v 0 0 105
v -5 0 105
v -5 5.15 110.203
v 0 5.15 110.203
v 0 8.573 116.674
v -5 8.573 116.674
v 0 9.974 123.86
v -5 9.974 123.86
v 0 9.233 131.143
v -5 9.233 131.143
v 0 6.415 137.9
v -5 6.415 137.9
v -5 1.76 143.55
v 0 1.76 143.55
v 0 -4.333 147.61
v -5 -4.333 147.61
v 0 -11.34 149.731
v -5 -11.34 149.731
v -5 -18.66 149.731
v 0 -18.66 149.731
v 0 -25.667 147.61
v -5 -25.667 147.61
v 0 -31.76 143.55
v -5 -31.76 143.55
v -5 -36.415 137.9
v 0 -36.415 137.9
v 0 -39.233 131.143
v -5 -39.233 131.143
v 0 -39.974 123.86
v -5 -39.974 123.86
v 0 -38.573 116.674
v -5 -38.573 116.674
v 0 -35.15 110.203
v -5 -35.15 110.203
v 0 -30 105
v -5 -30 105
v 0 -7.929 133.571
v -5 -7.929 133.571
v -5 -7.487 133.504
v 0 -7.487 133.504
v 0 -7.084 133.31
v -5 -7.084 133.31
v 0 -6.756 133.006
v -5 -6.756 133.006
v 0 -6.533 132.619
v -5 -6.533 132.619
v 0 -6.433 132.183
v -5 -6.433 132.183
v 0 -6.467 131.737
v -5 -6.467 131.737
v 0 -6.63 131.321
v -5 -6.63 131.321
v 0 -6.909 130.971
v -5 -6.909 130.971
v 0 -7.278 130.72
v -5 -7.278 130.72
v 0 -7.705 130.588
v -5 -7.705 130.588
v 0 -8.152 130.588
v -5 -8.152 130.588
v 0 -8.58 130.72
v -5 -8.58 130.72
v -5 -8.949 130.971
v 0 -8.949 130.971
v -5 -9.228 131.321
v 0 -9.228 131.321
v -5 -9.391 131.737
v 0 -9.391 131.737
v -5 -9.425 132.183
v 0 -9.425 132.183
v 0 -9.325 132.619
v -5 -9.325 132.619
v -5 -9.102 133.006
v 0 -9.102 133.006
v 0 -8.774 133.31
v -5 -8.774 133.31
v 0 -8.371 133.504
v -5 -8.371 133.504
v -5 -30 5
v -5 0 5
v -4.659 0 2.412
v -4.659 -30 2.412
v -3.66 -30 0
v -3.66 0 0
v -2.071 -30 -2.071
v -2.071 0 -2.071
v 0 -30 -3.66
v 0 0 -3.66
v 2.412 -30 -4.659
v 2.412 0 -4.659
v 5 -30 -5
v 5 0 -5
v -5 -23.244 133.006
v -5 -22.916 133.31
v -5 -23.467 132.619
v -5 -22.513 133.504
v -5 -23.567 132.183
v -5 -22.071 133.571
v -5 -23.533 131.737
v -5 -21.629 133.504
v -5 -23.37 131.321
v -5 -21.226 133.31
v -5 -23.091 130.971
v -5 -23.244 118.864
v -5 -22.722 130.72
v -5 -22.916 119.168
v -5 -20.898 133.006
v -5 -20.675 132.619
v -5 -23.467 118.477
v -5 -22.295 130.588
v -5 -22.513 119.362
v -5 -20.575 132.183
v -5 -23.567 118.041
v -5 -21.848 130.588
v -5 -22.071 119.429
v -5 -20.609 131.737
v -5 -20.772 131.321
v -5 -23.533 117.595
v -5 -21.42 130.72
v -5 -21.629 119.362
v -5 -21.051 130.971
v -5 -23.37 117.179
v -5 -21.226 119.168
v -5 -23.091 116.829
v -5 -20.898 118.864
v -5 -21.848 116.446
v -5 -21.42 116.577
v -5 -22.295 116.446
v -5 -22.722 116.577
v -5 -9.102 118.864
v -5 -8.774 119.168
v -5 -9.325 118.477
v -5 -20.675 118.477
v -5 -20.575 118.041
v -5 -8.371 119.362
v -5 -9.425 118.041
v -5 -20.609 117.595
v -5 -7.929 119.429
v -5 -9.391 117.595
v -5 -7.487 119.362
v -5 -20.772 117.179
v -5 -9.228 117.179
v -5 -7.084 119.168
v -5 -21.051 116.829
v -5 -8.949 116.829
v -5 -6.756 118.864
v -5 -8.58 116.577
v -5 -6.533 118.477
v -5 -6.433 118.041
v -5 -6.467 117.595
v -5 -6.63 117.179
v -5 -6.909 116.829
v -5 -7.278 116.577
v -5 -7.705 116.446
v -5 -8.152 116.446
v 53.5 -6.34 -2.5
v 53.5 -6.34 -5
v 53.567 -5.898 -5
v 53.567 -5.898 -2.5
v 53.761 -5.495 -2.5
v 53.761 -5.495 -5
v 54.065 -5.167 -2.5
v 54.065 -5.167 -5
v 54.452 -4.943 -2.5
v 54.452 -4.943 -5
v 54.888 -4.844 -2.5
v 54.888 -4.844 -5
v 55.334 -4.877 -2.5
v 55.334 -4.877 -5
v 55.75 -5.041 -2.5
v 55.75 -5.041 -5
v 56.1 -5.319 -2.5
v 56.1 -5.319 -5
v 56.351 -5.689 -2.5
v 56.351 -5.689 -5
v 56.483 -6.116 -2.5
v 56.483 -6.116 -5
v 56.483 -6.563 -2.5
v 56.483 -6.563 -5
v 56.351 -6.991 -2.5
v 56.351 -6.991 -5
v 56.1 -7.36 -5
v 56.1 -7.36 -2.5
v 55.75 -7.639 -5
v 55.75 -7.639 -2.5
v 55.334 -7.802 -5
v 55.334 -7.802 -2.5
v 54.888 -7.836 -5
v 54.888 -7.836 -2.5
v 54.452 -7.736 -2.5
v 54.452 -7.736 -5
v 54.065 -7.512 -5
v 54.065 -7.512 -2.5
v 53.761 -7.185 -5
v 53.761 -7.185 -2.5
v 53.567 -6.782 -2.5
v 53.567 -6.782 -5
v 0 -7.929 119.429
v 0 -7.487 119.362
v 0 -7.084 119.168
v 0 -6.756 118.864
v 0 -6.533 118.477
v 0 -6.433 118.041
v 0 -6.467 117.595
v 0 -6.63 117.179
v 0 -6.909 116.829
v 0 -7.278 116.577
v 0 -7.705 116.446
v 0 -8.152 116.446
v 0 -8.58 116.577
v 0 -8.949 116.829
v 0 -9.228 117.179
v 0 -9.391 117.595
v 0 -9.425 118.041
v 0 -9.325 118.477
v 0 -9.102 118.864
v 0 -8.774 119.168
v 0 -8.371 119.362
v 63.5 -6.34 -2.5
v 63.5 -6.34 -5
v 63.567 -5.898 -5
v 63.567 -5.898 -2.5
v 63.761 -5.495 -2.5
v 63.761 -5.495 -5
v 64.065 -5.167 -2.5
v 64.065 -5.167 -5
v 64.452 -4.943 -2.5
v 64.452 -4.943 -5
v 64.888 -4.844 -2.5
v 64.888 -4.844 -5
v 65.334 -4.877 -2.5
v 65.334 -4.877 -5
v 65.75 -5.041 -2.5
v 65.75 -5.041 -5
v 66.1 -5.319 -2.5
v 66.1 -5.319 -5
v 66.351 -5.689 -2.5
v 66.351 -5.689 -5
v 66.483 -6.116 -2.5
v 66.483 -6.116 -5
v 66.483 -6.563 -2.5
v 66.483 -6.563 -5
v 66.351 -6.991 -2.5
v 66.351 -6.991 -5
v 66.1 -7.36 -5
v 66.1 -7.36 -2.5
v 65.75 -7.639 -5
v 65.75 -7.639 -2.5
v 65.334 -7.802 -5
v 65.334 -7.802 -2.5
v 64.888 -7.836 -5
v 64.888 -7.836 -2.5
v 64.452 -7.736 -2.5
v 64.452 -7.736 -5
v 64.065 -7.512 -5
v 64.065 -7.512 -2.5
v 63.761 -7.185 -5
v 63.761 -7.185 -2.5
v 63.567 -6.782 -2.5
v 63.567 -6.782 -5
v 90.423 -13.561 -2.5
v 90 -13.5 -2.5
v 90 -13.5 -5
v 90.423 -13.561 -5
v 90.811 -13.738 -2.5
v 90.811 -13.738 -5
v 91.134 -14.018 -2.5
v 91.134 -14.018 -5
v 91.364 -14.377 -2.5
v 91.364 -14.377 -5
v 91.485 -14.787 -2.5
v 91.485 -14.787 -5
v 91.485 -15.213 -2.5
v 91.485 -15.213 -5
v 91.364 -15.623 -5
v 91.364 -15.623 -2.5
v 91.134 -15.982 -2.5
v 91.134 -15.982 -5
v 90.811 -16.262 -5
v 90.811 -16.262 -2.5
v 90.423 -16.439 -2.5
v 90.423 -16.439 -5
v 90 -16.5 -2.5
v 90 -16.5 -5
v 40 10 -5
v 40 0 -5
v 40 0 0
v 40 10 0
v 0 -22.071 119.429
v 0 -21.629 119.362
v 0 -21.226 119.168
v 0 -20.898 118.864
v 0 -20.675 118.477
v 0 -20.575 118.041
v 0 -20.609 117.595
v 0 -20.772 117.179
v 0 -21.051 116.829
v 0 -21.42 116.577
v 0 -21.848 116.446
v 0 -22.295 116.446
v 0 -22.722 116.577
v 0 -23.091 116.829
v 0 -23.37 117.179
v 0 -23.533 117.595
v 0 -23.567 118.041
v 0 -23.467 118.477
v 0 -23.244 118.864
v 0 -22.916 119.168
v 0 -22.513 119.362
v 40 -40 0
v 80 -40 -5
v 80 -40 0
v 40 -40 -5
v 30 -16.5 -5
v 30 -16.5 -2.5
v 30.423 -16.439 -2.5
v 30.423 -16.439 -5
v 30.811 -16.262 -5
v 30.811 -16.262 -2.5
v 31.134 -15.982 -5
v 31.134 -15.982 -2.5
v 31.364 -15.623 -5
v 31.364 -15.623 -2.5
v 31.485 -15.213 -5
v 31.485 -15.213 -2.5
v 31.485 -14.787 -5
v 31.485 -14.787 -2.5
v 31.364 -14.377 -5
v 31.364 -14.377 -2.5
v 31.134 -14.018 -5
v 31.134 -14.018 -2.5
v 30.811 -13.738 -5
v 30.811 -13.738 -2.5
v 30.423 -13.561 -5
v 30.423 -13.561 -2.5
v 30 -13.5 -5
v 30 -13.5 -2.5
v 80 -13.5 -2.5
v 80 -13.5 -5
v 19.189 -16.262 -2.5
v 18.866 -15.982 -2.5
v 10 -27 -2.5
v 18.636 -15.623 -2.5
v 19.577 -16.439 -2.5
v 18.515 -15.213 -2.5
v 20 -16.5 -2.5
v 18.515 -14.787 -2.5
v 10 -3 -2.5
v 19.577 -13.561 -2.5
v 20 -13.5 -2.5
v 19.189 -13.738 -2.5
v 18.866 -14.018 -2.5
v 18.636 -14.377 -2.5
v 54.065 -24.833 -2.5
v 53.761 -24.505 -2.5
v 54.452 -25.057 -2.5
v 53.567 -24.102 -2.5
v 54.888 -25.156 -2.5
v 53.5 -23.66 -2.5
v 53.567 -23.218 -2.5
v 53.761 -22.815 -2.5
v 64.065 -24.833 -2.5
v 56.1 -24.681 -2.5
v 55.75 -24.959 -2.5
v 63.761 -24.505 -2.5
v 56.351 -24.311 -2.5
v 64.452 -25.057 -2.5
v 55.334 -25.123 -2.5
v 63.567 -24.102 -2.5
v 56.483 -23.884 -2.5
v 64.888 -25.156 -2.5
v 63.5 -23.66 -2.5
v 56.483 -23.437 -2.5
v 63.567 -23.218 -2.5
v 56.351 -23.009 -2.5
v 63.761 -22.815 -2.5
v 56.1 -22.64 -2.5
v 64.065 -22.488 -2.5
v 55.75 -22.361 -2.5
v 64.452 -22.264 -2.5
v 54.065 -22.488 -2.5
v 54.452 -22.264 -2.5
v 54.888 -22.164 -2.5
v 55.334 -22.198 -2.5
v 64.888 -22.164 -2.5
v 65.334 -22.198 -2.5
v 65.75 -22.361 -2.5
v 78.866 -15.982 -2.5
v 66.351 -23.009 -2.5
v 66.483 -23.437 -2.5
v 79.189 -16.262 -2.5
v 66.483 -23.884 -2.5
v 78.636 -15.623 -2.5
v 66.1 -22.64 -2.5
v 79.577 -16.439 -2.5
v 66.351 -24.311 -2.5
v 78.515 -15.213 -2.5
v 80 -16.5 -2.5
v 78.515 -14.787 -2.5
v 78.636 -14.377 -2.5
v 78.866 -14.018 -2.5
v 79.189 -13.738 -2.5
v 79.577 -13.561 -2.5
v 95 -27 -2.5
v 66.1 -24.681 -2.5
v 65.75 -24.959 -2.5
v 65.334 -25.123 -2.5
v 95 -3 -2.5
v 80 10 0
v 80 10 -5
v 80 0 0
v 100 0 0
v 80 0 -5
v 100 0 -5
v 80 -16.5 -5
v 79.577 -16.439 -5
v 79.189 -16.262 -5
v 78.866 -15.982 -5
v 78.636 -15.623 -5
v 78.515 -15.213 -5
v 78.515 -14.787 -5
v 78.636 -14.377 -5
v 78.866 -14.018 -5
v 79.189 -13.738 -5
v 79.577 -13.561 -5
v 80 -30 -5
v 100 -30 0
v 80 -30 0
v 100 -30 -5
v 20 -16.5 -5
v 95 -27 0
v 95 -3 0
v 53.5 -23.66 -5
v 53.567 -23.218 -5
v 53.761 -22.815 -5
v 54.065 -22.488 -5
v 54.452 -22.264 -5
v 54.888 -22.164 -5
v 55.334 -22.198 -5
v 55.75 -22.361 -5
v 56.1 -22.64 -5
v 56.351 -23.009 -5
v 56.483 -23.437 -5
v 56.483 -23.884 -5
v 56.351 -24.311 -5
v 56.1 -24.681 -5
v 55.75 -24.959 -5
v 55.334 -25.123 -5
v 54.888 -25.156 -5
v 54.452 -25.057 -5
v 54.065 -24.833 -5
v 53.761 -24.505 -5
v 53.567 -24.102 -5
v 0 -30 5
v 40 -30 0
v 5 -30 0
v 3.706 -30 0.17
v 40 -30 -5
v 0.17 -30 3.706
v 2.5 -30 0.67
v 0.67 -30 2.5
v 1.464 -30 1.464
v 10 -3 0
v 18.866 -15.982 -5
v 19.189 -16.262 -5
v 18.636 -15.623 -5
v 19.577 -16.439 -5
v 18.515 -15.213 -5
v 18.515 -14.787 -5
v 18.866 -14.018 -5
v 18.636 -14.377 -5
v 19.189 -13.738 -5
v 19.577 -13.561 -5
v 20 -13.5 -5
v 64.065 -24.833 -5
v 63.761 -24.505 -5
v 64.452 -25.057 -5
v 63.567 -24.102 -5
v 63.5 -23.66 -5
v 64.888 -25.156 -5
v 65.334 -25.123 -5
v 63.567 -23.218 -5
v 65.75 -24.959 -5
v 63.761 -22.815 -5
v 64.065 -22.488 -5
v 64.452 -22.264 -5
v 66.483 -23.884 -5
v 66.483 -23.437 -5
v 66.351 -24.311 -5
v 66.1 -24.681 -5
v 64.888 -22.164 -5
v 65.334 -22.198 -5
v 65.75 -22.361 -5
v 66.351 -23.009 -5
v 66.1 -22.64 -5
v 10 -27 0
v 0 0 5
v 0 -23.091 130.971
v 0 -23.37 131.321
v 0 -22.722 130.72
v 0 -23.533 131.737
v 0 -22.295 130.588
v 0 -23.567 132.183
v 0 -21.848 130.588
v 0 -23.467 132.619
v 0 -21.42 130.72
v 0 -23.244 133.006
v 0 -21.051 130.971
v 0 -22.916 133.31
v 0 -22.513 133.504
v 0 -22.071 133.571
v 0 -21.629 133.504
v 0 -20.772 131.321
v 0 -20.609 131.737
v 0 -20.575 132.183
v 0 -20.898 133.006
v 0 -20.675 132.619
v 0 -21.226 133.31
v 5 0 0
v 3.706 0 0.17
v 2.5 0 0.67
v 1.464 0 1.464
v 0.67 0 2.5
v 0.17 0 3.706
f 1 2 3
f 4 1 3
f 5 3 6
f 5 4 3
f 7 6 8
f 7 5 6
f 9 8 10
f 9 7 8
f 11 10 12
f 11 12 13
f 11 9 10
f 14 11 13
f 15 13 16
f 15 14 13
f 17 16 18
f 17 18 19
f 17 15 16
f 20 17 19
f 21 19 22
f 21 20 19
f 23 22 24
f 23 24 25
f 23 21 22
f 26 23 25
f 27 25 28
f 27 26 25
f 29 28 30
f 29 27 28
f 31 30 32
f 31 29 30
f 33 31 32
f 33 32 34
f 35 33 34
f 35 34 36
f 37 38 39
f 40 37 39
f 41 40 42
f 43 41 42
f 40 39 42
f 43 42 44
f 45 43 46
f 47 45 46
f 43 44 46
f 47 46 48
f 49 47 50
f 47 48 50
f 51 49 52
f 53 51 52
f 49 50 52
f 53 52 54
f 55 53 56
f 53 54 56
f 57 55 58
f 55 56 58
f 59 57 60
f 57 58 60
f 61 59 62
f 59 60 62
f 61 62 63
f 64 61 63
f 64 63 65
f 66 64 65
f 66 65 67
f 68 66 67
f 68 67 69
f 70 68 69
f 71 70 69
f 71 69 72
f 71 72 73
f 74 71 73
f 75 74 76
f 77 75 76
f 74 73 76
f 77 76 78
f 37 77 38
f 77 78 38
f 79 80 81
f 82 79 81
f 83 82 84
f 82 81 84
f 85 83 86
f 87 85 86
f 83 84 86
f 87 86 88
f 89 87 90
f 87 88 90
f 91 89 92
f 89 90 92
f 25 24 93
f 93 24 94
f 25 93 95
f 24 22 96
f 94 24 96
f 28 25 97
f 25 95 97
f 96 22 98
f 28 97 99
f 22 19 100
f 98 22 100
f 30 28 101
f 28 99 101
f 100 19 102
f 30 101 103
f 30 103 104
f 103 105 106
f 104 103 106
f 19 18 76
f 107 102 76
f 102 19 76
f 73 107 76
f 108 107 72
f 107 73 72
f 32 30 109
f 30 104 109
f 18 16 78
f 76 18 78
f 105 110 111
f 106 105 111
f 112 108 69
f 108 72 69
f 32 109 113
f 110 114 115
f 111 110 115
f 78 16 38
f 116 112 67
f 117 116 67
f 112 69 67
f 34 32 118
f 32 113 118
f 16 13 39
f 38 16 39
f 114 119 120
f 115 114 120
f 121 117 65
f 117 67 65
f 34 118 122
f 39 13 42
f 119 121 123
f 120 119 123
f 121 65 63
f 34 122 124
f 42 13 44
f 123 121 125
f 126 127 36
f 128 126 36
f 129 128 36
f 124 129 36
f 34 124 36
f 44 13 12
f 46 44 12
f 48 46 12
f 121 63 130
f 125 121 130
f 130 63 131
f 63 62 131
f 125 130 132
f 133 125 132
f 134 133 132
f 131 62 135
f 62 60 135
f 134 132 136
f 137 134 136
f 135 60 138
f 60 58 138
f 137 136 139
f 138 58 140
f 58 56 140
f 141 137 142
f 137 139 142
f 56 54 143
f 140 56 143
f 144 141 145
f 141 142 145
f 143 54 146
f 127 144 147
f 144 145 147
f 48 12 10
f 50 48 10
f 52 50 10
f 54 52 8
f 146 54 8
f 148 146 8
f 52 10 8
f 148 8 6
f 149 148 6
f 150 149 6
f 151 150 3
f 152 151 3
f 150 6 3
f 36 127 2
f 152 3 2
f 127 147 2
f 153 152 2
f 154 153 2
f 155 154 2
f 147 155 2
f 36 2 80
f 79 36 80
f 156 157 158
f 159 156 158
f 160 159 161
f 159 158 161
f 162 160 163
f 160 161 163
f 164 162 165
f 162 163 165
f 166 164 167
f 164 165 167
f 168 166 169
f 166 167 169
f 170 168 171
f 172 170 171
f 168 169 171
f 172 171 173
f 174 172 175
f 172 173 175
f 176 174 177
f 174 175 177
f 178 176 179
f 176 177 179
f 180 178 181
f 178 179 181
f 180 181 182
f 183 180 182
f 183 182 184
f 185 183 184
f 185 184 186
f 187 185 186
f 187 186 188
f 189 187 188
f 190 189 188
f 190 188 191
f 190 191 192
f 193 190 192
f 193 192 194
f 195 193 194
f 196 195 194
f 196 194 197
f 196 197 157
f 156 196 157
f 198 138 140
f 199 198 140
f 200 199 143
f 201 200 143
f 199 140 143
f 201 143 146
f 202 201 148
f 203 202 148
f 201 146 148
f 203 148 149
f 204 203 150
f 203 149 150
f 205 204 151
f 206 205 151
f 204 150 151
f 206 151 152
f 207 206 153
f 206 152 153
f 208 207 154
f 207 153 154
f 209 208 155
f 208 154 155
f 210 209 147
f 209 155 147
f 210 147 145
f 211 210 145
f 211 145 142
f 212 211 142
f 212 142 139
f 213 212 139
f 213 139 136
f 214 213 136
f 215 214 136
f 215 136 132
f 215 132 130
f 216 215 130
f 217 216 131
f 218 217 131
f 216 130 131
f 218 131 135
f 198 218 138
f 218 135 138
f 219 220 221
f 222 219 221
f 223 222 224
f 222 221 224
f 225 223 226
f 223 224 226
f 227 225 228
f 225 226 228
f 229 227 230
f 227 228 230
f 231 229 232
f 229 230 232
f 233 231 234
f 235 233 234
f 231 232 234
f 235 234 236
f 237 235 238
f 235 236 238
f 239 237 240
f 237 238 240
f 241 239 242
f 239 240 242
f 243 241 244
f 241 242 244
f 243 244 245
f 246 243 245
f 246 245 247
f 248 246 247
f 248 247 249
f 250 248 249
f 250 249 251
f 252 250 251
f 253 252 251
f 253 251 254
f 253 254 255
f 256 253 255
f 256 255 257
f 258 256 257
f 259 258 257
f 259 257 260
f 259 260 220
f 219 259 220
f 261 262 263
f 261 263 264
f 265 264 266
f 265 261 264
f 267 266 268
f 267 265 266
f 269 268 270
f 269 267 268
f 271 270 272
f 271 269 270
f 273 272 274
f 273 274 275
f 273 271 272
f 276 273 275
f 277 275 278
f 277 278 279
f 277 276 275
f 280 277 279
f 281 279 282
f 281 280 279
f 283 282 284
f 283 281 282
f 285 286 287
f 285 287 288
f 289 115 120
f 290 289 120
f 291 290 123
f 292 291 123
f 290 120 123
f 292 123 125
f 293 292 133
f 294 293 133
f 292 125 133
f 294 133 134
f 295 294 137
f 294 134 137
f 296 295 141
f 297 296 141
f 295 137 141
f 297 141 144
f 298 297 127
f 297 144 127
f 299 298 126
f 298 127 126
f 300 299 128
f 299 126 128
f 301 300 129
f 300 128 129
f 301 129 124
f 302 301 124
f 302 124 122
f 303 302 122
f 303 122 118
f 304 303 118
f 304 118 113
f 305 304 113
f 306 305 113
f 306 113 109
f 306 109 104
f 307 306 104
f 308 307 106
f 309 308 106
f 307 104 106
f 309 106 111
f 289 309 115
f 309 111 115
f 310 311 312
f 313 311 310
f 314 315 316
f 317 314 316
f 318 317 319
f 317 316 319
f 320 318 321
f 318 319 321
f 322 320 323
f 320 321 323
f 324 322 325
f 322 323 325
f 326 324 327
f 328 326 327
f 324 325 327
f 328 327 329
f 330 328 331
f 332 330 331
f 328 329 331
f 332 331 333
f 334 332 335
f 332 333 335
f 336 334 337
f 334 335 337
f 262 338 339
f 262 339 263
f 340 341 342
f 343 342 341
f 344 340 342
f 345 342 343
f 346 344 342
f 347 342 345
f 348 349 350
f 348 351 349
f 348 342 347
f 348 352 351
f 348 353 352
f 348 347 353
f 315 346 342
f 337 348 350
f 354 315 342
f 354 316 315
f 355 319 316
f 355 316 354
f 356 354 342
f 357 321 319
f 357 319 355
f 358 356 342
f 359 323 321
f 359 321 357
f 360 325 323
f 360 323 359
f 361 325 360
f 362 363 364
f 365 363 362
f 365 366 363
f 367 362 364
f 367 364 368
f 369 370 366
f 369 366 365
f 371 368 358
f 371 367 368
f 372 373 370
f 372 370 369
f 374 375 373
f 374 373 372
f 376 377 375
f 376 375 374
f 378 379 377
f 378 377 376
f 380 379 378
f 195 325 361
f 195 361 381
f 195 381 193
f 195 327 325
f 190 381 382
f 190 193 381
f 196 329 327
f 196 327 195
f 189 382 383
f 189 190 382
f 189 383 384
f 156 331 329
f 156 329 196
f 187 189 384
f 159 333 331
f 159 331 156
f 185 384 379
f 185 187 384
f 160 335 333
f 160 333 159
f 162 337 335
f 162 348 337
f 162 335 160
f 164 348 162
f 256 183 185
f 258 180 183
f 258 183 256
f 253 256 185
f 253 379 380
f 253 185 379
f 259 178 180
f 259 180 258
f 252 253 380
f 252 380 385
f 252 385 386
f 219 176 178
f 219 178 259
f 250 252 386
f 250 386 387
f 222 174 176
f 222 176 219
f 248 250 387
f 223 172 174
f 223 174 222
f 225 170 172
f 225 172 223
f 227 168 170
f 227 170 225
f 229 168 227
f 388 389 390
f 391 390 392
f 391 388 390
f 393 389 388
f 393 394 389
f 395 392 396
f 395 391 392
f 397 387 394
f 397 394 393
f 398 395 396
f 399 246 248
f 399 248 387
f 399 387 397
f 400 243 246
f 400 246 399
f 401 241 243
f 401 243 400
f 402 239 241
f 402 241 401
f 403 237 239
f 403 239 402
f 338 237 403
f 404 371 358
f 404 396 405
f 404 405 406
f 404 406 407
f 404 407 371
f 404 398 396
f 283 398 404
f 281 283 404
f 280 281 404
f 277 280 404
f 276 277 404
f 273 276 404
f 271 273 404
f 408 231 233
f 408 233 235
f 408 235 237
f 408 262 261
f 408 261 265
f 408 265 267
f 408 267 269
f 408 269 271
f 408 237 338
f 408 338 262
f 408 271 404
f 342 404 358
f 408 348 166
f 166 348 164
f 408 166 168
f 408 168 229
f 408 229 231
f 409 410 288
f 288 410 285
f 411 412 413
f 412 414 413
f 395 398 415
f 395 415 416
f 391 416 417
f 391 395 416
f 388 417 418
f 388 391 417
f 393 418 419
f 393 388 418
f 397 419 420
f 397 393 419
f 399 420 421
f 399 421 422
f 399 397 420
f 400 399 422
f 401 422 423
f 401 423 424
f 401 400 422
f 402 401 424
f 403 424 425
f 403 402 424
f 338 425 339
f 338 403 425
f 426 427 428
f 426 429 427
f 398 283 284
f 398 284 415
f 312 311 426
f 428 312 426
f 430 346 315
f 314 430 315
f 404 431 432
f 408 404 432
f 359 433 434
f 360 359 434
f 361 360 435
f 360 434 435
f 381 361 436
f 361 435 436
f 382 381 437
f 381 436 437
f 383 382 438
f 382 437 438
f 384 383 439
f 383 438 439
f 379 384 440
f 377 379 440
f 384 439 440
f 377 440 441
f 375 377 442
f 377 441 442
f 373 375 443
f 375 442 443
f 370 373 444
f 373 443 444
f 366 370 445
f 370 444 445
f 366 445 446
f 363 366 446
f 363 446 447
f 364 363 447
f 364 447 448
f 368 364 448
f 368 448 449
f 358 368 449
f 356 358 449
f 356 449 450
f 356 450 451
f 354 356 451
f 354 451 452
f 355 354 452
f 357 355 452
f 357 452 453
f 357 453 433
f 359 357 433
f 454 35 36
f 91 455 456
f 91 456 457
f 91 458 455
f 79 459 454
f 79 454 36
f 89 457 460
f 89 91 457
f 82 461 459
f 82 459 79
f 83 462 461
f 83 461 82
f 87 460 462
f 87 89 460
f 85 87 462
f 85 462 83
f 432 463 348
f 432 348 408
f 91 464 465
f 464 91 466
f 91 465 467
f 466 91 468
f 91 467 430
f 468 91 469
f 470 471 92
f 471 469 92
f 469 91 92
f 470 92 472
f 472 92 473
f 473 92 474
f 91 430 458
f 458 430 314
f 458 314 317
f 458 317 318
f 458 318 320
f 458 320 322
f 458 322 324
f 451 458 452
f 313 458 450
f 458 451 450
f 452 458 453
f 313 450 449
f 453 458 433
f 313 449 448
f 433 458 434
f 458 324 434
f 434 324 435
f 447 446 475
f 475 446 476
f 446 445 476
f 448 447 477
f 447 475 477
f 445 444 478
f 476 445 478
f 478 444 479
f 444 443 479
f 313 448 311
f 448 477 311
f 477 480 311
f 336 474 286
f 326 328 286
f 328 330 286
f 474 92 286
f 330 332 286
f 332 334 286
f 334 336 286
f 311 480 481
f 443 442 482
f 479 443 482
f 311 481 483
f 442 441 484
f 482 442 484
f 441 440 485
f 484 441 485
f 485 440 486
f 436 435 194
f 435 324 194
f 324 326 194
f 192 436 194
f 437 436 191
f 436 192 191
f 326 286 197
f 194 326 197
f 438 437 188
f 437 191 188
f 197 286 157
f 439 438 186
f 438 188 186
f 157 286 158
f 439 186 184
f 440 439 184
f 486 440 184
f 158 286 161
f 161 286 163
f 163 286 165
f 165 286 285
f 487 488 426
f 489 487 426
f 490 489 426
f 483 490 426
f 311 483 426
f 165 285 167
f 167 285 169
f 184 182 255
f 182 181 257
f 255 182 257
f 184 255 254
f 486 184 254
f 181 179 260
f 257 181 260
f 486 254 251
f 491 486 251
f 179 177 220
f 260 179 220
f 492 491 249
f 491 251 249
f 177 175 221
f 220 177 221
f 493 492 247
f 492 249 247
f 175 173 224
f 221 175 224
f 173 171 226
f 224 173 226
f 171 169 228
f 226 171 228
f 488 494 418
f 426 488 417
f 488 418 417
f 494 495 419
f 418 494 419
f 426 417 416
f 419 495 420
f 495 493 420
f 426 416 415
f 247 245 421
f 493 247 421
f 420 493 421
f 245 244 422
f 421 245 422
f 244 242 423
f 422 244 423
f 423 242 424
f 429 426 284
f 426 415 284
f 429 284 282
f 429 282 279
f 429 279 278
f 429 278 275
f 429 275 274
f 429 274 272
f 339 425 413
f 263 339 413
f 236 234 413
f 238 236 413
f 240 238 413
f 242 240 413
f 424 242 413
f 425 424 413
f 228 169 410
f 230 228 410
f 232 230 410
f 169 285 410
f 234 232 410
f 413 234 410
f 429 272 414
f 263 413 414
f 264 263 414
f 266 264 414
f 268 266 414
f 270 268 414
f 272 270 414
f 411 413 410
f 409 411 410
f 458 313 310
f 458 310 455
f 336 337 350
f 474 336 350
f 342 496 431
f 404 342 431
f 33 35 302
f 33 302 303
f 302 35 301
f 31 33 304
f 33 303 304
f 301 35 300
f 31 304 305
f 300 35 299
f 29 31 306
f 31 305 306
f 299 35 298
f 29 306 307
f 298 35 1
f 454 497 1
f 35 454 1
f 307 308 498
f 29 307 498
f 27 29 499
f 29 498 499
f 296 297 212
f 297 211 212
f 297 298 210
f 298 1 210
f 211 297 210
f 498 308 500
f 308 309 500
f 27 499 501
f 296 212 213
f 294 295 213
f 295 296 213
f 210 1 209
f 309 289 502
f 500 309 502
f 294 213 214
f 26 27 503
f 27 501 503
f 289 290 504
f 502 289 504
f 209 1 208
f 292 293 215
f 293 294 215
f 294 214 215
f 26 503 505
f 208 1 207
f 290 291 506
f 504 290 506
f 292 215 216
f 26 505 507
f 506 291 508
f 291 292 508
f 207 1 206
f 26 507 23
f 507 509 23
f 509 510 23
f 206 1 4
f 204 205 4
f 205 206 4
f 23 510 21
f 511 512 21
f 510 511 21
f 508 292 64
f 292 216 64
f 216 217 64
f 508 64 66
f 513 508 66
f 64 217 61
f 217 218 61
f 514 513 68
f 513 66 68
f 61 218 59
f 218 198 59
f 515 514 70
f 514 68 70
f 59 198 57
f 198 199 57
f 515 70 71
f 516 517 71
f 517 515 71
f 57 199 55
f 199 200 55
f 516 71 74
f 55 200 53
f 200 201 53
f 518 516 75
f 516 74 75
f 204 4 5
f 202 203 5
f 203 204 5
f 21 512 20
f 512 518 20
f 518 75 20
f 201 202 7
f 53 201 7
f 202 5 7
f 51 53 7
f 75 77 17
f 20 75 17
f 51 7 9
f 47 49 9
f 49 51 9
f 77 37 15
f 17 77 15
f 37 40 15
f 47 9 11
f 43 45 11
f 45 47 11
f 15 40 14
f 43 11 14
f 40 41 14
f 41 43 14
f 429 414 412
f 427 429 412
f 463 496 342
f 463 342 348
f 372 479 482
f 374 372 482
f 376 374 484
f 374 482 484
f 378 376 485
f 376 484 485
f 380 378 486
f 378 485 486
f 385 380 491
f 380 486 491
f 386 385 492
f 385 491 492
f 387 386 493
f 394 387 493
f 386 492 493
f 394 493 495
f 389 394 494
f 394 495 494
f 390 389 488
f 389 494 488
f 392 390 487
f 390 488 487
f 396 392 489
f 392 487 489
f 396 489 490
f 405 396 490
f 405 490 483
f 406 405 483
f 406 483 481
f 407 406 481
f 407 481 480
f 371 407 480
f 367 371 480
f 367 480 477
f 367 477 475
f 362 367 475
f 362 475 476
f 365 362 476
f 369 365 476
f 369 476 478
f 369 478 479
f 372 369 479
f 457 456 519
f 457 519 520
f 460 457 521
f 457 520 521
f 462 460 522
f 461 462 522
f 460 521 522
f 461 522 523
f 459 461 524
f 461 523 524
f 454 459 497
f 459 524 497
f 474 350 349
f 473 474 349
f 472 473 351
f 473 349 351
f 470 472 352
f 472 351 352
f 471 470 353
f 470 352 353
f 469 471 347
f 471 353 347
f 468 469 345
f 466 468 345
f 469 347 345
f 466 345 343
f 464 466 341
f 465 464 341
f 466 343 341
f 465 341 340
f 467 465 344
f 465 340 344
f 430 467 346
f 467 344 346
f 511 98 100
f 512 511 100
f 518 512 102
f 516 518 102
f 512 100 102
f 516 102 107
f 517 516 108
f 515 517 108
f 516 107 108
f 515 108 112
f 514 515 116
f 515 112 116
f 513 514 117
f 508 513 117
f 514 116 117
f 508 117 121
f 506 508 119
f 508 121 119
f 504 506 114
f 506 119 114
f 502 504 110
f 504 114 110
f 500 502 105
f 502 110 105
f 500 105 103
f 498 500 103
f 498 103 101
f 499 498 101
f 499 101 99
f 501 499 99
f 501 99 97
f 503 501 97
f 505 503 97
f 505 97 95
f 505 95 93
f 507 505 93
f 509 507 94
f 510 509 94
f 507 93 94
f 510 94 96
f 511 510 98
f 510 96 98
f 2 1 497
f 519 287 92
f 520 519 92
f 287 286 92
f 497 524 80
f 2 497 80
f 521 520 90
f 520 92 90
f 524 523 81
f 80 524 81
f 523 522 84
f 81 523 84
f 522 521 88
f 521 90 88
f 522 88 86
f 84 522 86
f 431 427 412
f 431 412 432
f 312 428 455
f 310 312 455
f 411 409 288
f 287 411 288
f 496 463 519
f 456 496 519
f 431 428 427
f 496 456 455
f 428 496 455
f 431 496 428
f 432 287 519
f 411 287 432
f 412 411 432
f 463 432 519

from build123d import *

# Parameters (mm, degrees)
BOSS_EXTRUDE1_DEPTH = 30
SKETCH4_R           = 25
BOSS_EXTRUDE3_DEPTH = 5
SKETCH8_W           = 85
SKETCH8_H           = 24
CUT_EXTRUDE2_DEPTH  = 2.5
SKETCH11_R          = 1.5
CUT_EXTRUDE4_DEPTH  = 5
SKETCH12_W          = 40
SKETCH12_H          = 10
BOSS_EXTRUDE5_DEPTH = 5
CUT_EXTRUDE5_DEPTH  = 2.5
SKETCH14_R          = 1.5
CUT_EXTRUDE6_DEPTH  = 189.745860882


with BuildPart() as part:
    # Sketch1 → Boss-Extrude1 (new body)
    with BuildSketch(Plane(origin=(0, 0, 0), x_dir=(1, 0, 0), z_dir=(0, 1, 0))):
        with BuildLine():
            Line((0, -5), (0, -125))
            Line((0, -125), (-5, -125))
            Line((-5, -125), (-5, -5))
            ThreePointArc((-5, -5), (-2.071067812, 2.071067812), (5, 5))
            Line((5, 5), (100, 5))
            Line((100, 5), (100, 0))
            Line((100, 0), (5, 0))
            ThreePointArc((5, 0), (1.464466094, -1.464466094), (0, -5))
        make_face()
    extrude(amount=-BOSS_EXTRUDE1_DEPTH)

    # Sketch4 → Boss-Extrude3 (add)
    with BuildSketch(Plane(origin=(0, 0, 0), x_dir=(0, 0, -1), z_dir=(1, 0, 0))):
        with Locations((-125, -15)):
            Circle(SKETCH4_R)
    extrude(amount=-BOSS_EXTRUDE3_DEPTH)

    # Sketch8 → Cut-Extrude2 (cut)
    with BuildSketch(Plane.XY):
        with Locations((52.5, -15)):
            Rectangle(SKETCH8_W, SKETCH8_H)
    extrude(amount=-CUT_EXTRUDE2_DEPTH, mode=Mode.SUBTRACT)

    # Sketch11 → Cut-Extrude4 (cut)
    with BuildSketch(Plane.ZY.offset(5)):
        with Locations((132.071067812, -7.928932188)):
            Circle(SKETCH11_R)
        with Locations((132.071067812, -22.071067812)):
            Circle(SKETCH11_R)
        with Locations((117.928932188, -22.071067812)):
            Circle(SKETCH11_R)
        with Locations((117.928932188, -7.928932188)):
            Circle(SKETCH11_R)
    extrude(amount=-CUT_EXTRUDE4_DEPTH, mode=Mode.SUBTRACT)

    # Sketch12 → Boss-Extrude5 (add)
    with BuildSketch(Plane(origin=(0, 0, -5), x_dir=(-1, 0, 0), z_dir=(0, 0, -1))):
        with Locations((-60, 5)):
            Rectangle(SKETCH12_W, SKETCH12_H)
        with Locations((-60, -35)):
            Rectangle(SKETCH12_W, SKETCH12_H)
    extrude(amount=-BOSS_EXTRUDE5_DEPTH)

    # Sketch13 → Cut-Extrude5 (cut)
    with BuildSketch(Plane.XY.offset(-2.5)):
        with BuildLine():
            Line((90, -16.5), (80, -16.5))
            ThreePointArc((80, -16.5), (78.5, -15), (80, -13.5))
            Line((80, -13.5), (90, -13.5))
            ThreePointArc((90, -13.5), (91.5, -15), (90, -16.5))
        make_face()
        with BuildLine():
            Line((20, -16.5), (30, -16.5))
            ThreePointArc((30, -16.5), (31.5, -15), (30, -13.5))
            Line((30, -13.5), (20, -13.5))
            ThreePointArc((20, -13.5), (18.5, -15), (20, -16.5))
        make_face()
    extrude(amount=-CUT_EXTRUDE5_DEPTH, mode=Mode.SUBTRACT)

    # Sketch14 → Cut-Extrude6 (cut, through all)
    with BuildSketch(Plane(origin=(0, 0, -5), x_dir=(-1, 0, 0), z_dir=(0, 0, -1))):
        with Locations((-65, -6.339745962)):
            Circle(SKETCH14_R)
        with Locations((-55, -6.339745962)):
            Circle(SKETCH14_R)
        with Locations((-55, -23.660254038)):
            Circle(SKETCH14_R)
        with Locations((-65, -23.660254038)):
            Circle(SKETCH14_R)
    extrude(amount=-CUT_EXTRUDE6_DEPTH, mode=Mode.SUBTRACT)


solid = part.part
